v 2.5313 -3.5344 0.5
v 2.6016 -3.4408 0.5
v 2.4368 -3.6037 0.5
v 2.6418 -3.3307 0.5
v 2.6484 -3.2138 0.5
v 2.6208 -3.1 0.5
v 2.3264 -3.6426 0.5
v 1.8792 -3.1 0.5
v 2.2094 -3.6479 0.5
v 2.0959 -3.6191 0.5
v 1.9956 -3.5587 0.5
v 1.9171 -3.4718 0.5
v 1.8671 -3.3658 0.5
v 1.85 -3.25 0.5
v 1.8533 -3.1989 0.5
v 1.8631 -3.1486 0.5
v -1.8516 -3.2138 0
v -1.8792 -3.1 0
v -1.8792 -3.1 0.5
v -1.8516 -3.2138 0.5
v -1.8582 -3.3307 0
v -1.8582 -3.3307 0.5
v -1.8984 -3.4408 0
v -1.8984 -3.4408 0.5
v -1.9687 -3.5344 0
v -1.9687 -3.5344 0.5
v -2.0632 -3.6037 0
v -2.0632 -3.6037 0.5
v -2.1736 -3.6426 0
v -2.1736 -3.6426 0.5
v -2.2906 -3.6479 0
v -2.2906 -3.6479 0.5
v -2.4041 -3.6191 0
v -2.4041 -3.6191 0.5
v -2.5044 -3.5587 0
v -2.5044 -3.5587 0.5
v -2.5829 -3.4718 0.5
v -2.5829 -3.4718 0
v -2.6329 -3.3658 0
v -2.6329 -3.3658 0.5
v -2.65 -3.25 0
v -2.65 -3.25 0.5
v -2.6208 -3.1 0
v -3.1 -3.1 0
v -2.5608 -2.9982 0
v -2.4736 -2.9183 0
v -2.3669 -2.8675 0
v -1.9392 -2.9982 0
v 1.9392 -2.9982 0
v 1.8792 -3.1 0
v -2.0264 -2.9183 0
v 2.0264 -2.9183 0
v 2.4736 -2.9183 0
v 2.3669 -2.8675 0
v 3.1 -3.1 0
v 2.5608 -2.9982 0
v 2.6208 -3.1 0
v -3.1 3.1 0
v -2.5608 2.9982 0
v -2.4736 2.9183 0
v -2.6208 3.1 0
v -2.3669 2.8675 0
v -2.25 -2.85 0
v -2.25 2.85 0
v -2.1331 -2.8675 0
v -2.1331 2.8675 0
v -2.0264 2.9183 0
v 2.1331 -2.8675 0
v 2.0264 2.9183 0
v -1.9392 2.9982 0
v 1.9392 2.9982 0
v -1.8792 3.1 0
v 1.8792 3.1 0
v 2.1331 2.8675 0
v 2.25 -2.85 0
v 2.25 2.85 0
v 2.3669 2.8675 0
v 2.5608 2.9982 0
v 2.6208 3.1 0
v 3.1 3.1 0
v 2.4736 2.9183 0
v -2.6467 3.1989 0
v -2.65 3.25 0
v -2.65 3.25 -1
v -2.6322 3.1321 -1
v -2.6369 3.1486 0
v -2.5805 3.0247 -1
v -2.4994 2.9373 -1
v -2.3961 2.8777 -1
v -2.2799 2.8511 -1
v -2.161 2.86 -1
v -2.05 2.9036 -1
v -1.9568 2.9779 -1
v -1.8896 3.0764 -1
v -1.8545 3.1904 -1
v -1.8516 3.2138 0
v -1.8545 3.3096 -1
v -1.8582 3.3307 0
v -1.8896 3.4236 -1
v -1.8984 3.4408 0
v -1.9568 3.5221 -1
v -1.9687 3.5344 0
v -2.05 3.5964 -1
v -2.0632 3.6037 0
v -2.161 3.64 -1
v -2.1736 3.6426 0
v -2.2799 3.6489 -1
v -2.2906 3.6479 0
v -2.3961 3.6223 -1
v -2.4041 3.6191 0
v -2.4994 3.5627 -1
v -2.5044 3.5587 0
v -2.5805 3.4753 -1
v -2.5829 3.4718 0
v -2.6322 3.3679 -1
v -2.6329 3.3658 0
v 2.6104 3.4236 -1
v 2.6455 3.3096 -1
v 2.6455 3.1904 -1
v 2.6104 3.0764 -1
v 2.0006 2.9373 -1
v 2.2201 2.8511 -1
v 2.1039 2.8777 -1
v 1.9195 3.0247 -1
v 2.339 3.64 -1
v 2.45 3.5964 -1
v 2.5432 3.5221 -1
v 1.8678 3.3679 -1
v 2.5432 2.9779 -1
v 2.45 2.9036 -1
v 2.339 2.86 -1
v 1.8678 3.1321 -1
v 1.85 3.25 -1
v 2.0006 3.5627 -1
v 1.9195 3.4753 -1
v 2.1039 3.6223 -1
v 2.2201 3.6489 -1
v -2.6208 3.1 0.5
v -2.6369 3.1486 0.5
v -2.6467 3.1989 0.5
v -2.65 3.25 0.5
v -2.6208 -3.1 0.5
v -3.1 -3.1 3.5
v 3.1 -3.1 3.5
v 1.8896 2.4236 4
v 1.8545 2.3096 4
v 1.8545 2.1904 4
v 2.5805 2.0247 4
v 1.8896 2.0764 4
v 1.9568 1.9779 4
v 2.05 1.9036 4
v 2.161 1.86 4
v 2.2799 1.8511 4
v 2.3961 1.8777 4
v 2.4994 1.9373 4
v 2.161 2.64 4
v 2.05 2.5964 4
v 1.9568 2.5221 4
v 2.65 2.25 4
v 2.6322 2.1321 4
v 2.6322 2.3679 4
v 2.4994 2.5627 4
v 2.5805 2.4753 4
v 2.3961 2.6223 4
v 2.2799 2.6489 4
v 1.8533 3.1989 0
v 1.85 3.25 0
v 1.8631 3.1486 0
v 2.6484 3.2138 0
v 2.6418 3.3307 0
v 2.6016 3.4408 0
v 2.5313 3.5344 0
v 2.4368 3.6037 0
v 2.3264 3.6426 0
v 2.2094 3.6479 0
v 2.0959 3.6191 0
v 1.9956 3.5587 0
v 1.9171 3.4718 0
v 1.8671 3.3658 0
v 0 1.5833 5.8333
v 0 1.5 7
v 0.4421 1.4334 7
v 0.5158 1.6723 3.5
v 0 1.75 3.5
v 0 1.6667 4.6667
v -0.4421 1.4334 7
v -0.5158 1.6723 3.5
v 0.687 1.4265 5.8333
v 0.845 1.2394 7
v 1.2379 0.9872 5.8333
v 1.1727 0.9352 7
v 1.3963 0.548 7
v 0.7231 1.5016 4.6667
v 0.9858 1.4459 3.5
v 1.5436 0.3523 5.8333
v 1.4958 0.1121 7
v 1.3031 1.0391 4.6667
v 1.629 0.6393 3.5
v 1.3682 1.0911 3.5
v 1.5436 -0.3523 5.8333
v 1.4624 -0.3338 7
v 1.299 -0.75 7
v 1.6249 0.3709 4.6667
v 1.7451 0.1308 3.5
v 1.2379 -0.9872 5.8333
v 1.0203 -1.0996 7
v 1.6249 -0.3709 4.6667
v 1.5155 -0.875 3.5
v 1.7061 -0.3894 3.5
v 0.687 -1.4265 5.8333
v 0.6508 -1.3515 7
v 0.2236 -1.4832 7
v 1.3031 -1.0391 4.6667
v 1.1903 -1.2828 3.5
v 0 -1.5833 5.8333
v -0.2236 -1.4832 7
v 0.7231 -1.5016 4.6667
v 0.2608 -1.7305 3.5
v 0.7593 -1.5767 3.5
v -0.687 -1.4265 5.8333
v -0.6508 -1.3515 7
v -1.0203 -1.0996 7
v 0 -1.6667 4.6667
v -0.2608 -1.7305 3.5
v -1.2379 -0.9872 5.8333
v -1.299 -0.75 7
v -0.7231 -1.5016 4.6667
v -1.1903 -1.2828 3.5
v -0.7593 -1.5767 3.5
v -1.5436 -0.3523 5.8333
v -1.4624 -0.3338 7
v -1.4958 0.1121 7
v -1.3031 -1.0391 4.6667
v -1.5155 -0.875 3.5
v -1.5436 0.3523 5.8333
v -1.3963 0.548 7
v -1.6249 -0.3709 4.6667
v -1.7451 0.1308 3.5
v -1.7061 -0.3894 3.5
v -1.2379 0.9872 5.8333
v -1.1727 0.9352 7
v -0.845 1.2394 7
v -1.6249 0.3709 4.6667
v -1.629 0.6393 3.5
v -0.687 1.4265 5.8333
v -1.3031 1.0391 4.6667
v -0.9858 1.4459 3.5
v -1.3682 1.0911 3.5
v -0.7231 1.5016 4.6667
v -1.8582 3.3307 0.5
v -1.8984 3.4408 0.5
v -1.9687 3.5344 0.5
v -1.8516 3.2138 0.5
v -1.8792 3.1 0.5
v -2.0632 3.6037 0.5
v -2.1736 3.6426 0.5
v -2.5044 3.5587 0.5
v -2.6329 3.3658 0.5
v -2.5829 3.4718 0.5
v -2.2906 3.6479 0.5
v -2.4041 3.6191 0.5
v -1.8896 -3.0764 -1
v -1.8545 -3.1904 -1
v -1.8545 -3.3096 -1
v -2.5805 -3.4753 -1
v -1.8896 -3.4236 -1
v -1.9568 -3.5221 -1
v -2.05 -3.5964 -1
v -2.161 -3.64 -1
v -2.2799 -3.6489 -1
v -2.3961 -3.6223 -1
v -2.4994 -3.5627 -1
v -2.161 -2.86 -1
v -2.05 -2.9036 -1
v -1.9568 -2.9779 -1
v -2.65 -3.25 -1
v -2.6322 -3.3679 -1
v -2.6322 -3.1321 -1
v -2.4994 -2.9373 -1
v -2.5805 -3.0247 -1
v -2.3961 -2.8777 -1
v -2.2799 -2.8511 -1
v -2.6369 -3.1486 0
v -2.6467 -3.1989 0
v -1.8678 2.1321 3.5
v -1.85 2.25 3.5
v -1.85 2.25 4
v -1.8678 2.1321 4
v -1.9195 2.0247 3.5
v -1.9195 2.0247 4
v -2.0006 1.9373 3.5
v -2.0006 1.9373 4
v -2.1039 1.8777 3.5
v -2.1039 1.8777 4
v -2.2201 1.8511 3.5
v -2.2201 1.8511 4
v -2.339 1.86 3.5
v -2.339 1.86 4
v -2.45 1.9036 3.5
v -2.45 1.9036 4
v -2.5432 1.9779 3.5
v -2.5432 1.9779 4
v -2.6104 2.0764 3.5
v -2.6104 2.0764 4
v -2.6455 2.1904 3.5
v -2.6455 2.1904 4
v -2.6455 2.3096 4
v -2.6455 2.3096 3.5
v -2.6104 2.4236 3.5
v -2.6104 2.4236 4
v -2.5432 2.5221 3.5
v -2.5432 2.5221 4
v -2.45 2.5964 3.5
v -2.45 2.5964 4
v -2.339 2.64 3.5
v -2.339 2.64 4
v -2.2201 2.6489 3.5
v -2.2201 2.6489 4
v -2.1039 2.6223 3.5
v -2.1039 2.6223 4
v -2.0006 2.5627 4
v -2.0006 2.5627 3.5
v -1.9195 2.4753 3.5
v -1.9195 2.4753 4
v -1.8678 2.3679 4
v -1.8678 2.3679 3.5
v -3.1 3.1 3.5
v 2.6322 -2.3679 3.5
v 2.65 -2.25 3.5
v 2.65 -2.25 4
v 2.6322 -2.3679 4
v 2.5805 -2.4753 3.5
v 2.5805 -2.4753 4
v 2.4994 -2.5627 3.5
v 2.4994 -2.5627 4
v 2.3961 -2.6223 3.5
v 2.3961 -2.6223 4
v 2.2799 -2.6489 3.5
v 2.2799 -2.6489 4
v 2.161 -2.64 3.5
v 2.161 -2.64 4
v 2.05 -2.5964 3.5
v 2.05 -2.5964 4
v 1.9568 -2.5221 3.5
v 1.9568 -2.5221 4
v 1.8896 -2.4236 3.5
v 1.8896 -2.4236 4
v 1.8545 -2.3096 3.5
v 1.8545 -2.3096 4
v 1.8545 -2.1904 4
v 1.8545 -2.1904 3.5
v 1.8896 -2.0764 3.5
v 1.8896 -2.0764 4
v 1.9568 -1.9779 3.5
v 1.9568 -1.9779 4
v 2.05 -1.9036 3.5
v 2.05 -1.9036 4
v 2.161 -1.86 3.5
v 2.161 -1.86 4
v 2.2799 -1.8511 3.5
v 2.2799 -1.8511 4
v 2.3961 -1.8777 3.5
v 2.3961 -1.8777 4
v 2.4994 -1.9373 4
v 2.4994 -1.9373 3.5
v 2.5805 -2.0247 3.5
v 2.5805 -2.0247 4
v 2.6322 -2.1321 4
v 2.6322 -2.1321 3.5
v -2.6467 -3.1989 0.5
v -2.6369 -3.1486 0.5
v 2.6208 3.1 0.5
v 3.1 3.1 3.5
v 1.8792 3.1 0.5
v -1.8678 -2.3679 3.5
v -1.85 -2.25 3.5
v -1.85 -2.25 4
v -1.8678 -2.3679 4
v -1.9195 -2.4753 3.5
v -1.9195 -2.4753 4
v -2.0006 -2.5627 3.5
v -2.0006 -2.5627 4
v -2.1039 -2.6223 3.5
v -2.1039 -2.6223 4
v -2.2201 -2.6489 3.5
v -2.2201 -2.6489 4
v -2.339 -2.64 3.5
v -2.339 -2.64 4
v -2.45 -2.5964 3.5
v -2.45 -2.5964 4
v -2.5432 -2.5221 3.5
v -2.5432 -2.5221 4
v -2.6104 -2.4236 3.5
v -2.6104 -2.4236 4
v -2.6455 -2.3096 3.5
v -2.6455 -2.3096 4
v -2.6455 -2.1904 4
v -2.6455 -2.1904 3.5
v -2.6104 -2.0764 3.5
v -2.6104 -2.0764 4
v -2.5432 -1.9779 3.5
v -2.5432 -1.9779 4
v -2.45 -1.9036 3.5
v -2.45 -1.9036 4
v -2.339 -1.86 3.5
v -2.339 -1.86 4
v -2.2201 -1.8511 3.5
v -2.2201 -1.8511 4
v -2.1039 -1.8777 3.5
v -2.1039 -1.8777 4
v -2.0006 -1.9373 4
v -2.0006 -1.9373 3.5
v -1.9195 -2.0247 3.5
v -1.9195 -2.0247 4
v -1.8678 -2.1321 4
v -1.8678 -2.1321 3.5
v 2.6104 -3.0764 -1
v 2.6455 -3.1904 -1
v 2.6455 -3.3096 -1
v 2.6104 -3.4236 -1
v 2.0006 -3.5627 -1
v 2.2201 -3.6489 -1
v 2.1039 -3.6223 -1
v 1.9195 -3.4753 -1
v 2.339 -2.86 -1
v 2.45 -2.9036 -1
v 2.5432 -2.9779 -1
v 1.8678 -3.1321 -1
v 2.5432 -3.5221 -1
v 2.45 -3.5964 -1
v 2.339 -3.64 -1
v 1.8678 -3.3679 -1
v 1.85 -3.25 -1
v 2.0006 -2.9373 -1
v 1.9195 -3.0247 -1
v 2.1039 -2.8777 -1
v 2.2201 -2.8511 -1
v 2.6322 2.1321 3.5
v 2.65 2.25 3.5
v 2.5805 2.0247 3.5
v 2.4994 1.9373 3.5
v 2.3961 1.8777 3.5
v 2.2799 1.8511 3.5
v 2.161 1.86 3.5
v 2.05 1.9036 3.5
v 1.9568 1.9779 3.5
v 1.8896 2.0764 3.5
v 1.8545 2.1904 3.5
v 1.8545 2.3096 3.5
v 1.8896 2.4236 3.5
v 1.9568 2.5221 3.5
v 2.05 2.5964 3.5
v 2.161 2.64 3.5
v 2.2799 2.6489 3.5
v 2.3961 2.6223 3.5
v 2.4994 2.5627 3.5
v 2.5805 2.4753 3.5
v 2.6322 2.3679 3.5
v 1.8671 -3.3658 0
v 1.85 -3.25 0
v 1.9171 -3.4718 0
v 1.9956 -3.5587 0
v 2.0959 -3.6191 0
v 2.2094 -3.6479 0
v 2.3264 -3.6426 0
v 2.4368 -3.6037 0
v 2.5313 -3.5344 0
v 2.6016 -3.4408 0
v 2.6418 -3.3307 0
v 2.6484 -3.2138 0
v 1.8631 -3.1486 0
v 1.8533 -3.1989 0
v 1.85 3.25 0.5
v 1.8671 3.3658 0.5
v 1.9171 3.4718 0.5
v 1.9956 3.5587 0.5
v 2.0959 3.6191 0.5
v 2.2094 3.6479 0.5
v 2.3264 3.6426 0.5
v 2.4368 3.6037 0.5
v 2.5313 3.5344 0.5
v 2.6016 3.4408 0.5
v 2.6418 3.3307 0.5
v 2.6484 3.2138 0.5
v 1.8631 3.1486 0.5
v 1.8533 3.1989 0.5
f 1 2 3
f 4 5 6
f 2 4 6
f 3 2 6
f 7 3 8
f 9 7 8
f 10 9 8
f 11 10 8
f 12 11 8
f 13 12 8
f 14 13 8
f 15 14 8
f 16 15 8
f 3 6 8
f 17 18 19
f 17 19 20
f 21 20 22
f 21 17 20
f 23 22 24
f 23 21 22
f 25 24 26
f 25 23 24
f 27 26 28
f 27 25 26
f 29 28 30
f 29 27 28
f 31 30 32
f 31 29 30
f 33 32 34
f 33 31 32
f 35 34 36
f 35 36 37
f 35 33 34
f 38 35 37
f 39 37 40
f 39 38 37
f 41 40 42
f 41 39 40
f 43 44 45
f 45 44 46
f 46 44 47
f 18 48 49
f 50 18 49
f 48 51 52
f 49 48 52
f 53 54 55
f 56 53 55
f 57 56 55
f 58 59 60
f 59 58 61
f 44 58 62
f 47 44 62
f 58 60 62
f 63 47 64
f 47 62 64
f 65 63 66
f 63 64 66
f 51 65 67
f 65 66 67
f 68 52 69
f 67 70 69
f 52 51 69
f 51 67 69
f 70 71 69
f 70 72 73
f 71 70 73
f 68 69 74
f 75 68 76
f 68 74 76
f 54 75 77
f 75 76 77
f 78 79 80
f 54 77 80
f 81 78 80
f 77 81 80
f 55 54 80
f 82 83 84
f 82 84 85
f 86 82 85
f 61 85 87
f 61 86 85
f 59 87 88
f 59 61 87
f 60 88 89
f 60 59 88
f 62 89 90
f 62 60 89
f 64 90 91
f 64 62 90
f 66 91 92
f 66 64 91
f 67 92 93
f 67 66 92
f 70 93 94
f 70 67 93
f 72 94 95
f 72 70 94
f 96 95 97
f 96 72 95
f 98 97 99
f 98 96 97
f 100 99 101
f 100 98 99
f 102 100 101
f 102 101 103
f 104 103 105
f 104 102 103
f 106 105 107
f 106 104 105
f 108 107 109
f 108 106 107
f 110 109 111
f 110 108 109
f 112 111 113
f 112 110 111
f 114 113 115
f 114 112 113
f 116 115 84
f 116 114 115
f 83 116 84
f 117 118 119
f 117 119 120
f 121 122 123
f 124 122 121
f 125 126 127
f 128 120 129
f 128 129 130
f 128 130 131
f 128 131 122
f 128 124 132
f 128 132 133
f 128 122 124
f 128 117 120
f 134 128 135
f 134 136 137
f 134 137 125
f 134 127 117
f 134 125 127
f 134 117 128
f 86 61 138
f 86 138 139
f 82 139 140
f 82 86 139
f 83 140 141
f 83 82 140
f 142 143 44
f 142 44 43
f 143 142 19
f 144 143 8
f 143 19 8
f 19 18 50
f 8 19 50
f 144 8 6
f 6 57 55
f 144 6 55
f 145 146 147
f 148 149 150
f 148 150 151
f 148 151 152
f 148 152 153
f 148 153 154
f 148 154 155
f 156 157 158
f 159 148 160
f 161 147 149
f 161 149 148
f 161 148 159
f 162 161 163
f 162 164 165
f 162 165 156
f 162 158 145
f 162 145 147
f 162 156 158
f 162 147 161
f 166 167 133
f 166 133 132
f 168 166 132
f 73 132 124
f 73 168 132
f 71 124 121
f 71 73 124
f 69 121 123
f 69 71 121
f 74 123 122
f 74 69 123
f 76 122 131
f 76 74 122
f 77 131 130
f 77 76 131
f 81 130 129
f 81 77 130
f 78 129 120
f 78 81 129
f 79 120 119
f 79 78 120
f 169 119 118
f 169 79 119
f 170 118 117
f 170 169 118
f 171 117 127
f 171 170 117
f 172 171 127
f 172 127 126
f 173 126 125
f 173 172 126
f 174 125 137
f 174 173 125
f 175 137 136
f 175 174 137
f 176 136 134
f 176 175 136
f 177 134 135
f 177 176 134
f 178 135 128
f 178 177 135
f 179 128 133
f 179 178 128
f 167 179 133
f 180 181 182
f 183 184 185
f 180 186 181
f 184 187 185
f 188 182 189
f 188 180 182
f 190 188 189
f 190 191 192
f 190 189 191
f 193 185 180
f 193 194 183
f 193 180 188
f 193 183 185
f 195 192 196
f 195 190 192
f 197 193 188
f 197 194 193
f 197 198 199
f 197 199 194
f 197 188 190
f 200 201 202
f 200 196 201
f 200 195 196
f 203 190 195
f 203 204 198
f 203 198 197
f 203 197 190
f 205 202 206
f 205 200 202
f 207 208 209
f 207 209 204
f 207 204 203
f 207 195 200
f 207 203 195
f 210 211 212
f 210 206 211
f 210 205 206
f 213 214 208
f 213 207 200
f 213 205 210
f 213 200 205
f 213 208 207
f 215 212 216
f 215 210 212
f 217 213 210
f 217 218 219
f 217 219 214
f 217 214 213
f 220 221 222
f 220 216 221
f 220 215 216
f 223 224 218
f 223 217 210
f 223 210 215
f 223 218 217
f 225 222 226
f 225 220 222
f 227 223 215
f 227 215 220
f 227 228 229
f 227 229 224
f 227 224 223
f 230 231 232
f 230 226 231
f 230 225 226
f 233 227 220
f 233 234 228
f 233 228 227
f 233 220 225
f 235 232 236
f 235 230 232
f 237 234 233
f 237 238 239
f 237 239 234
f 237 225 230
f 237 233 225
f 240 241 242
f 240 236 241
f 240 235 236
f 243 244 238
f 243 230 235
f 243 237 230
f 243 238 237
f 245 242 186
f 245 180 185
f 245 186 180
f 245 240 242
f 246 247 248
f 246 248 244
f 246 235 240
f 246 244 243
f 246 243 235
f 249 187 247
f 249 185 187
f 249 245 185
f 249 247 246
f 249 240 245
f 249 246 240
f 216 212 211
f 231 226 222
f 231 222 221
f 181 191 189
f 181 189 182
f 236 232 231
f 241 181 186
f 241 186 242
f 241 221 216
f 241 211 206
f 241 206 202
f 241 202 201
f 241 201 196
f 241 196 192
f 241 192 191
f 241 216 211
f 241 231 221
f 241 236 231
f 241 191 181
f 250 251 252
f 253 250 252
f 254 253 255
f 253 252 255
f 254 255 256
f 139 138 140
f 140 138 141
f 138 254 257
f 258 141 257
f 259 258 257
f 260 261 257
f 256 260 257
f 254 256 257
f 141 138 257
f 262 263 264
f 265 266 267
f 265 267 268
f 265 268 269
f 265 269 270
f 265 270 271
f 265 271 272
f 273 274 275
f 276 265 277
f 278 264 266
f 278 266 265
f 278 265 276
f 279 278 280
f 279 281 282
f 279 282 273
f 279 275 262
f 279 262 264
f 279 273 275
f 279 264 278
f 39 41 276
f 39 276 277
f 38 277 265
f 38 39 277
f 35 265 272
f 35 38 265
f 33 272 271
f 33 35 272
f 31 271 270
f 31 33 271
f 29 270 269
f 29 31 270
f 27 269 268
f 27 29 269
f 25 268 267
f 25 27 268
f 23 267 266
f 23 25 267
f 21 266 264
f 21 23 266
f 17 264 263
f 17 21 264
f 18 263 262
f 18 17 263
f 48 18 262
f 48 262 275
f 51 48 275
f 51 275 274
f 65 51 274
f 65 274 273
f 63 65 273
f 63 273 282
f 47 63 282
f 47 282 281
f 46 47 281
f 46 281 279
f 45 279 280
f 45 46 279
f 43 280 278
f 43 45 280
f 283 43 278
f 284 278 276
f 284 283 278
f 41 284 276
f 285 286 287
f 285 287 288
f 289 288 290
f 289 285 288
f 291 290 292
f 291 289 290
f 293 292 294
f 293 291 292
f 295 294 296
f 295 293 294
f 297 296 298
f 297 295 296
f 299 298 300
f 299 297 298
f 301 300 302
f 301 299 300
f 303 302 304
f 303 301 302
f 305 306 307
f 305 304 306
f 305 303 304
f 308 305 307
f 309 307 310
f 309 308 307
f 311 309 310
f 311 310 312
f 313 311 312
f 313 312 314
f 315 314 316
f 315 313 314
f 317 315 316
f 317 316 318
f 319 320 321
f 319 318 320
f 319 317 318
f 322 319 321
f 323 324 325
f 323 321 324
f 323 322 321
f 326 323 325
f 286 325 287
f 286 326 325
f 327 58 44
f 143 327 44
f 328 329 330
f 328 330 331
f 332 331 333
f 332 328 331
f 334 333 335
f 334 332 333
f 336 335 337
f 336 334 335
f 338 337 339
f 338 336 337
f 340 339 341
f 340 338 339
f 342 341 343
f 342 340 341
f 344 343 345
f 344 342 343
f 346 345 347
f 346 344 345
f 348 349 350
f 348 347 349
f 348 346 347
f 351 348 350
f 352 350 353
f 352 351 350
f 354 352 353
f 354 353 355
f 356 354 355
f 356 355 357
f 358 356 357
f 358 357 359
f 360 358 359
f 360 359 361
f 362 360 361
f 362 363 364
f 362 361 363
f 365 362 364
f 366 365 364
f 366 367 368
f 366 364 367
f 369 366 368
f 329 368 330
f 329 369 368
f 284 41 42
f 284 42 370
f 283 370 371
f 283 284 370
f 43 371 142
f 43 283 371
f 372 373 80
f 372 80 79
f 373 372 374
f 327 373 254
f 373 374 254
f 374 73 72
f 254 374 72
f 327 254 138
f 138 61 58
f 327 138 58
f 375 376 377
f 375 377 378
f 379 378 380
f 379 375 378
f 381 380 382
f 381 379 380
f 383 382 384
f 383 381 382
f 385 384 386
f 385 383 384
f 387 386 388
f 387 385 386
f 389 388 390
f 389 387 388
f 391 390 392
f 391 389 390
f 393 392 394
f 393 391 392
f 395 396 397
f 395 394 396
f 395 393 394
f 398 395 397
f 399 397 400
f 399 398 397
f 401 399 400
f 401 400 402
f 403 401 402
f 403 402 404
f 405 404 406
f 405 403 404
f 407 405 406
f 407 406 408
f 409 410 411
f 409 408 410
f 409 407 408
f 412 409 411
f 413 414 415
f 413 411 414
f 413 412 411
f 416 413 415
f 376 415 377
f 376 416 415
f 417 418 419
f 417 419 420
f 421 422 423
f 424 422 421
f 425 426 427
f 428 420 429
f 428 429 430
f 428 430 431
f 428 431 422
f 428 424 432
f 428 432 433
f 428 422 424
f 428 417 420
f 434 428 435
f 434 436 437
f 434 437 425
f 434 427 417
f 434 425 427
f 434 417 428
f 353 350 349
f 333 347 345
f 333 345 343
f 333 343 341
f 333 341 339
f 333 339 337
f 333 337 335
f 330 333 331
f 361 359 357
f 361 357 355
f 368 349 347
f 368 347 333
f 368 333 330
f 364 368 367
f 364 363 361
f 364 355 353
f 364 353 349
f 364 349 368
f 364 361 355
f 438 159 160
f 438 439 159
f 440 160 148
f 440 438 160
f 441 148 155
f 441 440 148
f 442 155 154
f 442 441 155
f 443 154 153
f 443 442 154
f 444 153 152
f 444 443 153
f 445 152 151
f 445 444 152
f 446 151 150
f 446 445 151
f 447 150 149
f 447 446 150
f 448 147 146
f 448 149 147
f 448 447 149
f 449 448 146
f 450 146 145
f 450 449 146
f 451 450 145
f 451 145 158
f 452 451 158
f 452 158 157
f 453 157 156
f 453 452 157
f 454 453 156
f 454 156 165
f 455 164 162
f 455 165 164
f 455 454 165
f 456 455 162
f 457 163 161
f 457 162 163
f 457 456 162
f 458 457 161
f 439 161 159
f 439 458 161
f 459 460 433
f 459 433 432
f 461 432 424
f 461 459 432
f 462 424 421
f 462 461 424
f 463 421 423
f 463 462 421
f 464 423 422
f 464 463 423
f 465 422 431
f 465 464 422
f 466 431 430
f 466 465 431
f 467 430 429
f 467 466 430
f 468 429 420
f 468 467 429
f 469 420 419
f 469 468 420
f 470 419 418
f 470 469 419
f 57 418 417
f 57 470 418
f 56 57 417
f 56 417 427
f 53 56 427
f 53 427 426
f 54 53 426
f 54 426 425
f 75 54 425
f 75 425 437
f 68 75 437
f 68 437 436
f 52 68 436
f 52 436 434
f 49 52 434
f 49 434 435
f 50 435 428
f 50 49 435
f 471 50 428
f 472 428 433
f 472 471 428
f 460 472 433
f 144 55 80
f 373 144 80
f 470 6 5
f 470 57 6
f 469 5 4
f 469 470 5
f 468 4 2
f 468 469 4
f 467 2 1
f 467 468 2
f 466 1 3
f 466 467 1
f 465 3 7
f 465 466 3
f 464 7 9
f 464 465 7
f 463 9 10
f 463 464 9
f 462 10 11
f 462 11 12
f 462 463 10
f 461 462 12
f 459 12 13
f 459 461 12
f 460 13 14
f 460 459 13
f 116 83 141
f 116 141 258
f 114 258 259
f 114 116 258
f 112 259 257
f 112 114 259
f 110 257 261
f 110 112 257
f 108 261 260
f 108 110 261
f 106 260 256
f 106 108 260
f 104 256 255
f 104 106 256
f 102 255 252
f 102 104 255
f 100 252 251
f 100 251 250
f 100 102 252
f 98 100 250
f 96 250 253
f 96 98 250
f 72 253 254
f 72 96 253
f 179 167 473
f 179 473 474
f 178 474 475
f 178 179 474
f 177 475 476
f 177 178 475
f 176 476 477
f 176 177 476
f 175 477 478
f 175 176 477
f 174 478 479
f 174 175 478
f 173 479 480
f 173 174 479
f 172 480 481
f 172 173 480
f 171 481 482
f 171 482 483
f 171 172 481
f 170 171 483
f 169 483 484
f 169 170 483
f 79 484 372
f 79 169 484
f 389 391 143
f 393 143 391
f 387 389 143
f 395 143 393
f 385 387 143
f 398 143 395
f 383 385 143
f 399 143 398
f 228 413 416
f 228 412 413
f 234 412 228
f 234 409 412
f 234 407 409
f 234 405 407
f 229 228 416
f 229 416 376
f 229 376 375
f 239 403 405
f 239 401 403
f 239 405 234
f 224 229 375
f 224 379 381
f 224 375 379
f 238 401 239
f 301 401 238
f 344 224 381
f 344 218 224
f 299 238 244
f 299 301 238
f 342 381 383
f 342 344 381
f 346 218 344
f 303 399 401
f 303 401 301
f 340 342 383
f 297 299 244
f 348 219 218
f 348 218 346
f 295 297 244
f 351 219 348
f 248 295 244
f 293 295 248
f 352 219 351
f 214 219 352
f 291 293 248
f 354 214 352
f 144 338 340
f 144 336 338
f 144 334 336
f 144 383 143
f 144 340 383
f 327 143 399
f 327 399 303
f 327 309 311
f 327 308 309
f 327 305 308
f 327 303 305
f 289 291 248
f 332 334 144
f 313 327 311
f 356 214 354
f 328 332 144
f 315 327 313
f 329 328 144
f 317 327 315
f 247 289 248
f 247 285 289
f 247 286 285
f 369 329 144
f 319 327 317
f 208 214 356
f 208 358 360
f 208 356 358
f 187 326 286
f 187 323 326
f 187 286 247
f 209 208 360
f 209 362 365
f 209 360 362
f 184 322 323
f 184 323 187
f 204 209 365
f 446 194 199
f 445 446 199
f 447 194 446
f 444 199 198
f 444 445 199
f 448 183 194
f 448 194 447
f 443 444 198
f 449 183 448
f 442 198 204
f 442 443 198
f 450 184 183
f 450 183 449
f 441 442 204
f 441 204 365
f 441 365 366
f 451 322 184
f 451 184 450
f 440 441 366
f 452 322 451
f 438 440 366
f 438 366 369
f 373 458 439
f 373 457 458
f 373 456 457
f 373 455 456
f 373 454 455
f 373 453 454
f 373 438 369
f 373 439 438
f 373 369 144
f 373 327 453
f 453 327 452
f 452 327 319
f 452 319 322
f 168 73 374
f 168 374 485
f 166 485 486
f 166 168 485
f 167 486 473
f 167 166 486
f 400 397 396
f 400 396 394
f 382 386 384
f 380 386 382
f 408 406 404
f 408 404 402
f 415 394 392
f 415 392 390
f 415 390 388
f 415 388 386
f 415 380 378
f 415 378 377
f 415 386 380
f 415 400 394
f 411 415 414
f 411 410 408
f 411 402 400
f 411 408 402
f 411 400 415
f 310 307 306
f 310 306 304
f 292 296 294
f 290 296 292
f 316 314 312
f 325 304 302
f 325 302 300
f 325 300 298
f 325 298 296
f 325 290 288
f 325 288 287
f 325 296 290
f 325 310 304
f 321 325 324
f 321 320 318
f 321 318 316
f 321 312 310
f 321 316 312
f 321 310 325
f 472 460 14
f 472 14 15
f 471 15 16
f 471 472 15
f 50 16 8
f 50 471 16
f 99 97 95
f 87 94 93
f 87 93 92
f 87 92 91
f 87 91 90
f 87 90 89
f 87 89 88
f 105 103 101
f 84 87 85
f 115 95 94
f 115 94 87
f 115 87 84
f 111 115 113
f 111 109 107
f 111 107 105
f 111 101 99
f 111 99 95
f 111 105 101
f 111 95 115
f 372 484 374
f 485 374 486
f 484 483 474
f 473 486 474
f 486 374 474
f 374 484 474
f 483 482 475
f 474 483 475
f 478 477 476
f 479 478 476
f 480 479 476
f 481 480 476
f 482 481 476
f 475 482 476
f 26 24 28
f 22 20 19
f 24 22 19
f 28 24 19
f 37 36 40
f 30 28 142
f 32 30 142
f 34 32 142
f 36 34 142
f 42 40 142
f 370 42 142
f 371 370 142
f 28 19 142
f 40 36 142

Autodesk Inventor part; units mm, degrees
ref_plane "YZ Plane" through (0, 0, 0) normal (1, 0, 0) x (0, 1, 0)
ref_plane "XZ Plane" through (0, 0, 0) normal (0, 1, 0) x (-1, 0, 0)
ref_plane "XY Plane" through (0, 0, 0) normal (0, 0, 1) x (1, 0, 0)
sketch "スケッチ1" plane through (0, 0, 0) normal (0, 0, 1) x (1, 0, 0)
  line L0 (-3.1, -3.1) -> (3.1, -3.1)
  line L1 (3.1, -3.1) -> (3.1, 3.1)
  line L2 (3.1, 3.1) -> (-3.1, 3.1)
  line L3 (-3.1, 3.1) -> (-3.1, -3.1)
  line L4 (-3.1, -3.1) -> (3.1, 3.1) construction
  line L5 (3.1, -3.1) -> (-3.1, 3.1) construction
  point P0 (0, 0)
  dimension "d0" = 6.2
  dimension "d2" = 6.2
extrude "押し出し1" add sketch "スケッチ1" along normal blind 3.5
sketch "スケッチ2" plane through (0, 0, 3.5) normal (0, 0, 1) x (1, 0, 0)
  line L0 (-2.25, -2.25) -> (2.25, -2.25) construction
  line L1 (2.25, -2.25) -> (2.25, 2.25) construction
  line L2 (2.25, 2.25) -> (-2.25, 2.25) construction
  line L3 (-2.25, 2.25) -> (-2.25, -2.25) construction
  line L4 (-2.25, -2.25) -> (2.25, 2.25) construction
  line L5 (2.25, -2.25) -> (-2.25, 2.25) construction
  circle A0 centre (-2.25, 2.25) radius 0.4
  circle A1 centre (2.25, 2.25) radius 0.4
  circle A2 centre (2.25, -2.25) radius 0.4
  circle A3 centre (-2.25, -2.25) radius 0.4
  point P0 (0, 0)
  dimension "d5" = 4.5
  dimension "d6" = 0.8
extrude "押し出し2" add sketch "スケッチ2" along normal blind 0.5
sketch "スケッチ3" plane through (0, 0, 0) normal (1, 0, 0) x (0, 1, 0)
  line L0 (3.1, 3.5) -> (-3.1, 3.5) projected
  line L1 (0, 3.5) -> (0, 7)
  line L2 (0, 7) -> (1.5, 7)
  line L3 (1.5, 7) -> (1.75, 3.5)
  line L4 (1.75, 3.5) -> (0, 3.5)
  point P0 (0, 0)
  dimension "d9" = 1.75
  dimension "d10" = 3.5
  dimension "d11" = 1.5
revolve "回転1" add sketch "スケッチ3" angle 360 about axis through (0, 0, 3.5) along (0, 0, 1)
sketch "スケッチ4" plane through (0, 0, 0) normal (0, 0, -1) x (-1, 0, 0)
  line L0 (2.25, -3.25) -> (-2.25, -3.25) construction
  line L1 (-2.25, -3.25) -> (-2.25, 3.25) construction
  line L2 (-2.25, 3.25) -> (2.25, 3.25) construction
  line L3 (2.25, 3.25) -> (2.25, -3.25) construction
  line L4 (2.25, -3.25) -> (-2.25, 3.25) construction
  line L5 (-2.25, -3.25) -> (2.25, 3.25) construction
  circle A0 centre (-2.25, 3.25) radius 0.4
  circle A1 centre (2.25, 3.25) radius 0.4
  circle A2 centre (2.25, -3.25) radius 0.4
  circle A3 centre (-2.25, -3.25) radius 0.4
  point P0 (0, 0)
  dimension "d13" = 4.5
  dimension "d14" = 6.5
  dimension "d15" = 0.8
extrude "押し出し3" add sketch "スケッチ4" along normal blind 1 and the other way blind 0.5
properties part number "DTS-6-V"
